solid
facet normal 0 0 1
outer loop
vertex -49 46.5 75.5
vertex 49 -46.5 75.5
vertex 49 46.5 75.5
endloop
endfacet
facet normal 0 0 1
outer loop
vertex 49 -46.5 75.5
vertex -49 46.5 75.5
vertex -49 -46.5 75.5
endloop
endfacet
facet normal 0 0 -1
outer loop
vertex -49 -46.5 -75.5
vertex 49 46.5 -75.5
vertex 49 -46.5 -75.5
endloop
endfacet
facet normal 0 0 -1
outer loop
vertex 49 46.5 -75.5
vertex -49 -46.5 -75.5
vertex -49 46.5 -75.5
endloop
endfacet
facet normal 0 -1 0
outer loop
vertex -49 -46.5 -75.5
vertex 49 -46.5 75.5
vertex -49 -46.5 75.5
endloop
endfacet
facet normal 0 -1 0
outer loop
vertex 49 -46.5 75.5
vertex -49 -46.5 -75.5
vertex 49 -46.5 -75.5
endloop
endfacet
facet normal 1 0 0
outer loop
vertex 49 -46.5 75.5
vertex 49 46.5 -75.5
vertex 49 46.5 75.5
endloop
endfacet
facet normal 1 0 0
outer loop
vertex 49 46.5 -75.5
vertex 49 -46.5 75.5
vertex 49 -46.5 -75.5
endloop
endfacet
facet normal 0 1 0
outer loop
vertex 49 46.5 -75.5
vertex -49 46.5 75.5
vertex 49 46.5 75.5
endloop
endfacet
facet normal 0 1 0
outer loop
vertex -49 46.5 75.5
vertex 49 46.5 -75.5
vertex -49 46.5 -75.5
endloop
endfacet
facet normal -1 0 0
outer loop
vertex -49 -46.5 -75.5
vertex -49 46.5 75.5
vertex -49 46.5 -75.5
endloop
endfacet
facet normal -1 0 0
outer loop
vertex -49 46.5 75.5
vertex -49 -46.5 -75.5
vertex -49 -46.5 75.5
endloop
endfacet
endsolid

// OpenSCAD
// file: consts.scad
/*
DESCRIPTION
  Constants for SCUSU CAD model.

AUTHORS
  Saxon A. Nelson-Milton <saxon@ausocean.org>

LICENSE
  Copyright (C) 2020 the Australian Ocean Lab (AusOcean)

  It is free software: you can redistribute it and/or modify them
  under the terms of the GNU General Public License as published by the
  Free Software Foundation, either version 3 of the License, or (at your
  option) any later version.

  It is distributed in the hope that it will be useful, but WITHOUT
  ANY WARRANTY; without even the implied warranty of MERCHANTABILITY or
  FITNESS FOR A PARTICULAR PURPOSE. See the GNU General Public License
  for more details.

  You should have received a copy of the GNU General Public License
  in gpl.txt.  If not, see http://www.gnu.org/licenses.
*/

alpha = 0.5;

// Misc.
noOfFaces = 500;

$fn = noOfFaces;

// Pipe properties.
pipeLength              = 600;
pipeOuterDiameter       = 160;
pipeInternalDiameter    = 155;

// Access coupling properties.
couplingInnerDiameter = 160;
couplingOuterDiameter = couplingInnerDiameter+10;
couplingLength        = 160;

// Threaded cap properties.
capInnerDiameter    = couplingOuterDiameter;
capOuterDiameter    = 185;
capLength           = 35;

// Battery properties.
battLength = 151;
battWidth = 98;
battHeight = 93;

// Wood properties.
woodColor = [1,178/255,102/255];
woodThickness = 10;

// Battery holder end properties.
holderEndWidth = woodThickness;
holderEndDiameter = pipeInternalDiameter;

// Calculate battery displacement from center.
battDisplacement = sqrt(pow(pipeInternalDiameter/2,2)-pow(battWidth/2,2))-(battHeight/2);

// Reed switch properties.
reedSwitchLen = 40;
reedSwitchWidth = 10;
reedSwitchHeight = 10;
reedSwitchDisplacement = 30;

// Spacer properties.
spacerLegHeight = 120;
spacerLegLength = 80;
// main file
/*
DESCRIPTION
  Model of a 12V battery.

AUTHORS
  Saxon A. Nelson-Milton <saxon@ausocean.org>

LICENSE
  Copyright (C) 2020 the Australian Ocean Lab (AusOcean)

  It is free software: you can redistribute it and/or modify them
  under the terms of the GNU General Public License as published by the
  Free Software Foundation, either version 3 of the License, or (at your
  option) any later version.

  It is distributed in the hope that it will be useful, but WITHOUT
  ANY WARRANTY; without even the implied warranty of MERCHANTABILITY or
  FITNESS FOR A PARTICULAR PURPOSE. See the GNU General Public License
  for more details.

  You should have received a copy of the GNU General Public License
  in gpl.txt.  If not, see http://www.gnu.org/licenses.
*/

include <consts.scad>

battery();

module battery(){
    color([0.2,0.2,0.2])
    cube([battWidth,battHeight,battLength],center=true);
}
